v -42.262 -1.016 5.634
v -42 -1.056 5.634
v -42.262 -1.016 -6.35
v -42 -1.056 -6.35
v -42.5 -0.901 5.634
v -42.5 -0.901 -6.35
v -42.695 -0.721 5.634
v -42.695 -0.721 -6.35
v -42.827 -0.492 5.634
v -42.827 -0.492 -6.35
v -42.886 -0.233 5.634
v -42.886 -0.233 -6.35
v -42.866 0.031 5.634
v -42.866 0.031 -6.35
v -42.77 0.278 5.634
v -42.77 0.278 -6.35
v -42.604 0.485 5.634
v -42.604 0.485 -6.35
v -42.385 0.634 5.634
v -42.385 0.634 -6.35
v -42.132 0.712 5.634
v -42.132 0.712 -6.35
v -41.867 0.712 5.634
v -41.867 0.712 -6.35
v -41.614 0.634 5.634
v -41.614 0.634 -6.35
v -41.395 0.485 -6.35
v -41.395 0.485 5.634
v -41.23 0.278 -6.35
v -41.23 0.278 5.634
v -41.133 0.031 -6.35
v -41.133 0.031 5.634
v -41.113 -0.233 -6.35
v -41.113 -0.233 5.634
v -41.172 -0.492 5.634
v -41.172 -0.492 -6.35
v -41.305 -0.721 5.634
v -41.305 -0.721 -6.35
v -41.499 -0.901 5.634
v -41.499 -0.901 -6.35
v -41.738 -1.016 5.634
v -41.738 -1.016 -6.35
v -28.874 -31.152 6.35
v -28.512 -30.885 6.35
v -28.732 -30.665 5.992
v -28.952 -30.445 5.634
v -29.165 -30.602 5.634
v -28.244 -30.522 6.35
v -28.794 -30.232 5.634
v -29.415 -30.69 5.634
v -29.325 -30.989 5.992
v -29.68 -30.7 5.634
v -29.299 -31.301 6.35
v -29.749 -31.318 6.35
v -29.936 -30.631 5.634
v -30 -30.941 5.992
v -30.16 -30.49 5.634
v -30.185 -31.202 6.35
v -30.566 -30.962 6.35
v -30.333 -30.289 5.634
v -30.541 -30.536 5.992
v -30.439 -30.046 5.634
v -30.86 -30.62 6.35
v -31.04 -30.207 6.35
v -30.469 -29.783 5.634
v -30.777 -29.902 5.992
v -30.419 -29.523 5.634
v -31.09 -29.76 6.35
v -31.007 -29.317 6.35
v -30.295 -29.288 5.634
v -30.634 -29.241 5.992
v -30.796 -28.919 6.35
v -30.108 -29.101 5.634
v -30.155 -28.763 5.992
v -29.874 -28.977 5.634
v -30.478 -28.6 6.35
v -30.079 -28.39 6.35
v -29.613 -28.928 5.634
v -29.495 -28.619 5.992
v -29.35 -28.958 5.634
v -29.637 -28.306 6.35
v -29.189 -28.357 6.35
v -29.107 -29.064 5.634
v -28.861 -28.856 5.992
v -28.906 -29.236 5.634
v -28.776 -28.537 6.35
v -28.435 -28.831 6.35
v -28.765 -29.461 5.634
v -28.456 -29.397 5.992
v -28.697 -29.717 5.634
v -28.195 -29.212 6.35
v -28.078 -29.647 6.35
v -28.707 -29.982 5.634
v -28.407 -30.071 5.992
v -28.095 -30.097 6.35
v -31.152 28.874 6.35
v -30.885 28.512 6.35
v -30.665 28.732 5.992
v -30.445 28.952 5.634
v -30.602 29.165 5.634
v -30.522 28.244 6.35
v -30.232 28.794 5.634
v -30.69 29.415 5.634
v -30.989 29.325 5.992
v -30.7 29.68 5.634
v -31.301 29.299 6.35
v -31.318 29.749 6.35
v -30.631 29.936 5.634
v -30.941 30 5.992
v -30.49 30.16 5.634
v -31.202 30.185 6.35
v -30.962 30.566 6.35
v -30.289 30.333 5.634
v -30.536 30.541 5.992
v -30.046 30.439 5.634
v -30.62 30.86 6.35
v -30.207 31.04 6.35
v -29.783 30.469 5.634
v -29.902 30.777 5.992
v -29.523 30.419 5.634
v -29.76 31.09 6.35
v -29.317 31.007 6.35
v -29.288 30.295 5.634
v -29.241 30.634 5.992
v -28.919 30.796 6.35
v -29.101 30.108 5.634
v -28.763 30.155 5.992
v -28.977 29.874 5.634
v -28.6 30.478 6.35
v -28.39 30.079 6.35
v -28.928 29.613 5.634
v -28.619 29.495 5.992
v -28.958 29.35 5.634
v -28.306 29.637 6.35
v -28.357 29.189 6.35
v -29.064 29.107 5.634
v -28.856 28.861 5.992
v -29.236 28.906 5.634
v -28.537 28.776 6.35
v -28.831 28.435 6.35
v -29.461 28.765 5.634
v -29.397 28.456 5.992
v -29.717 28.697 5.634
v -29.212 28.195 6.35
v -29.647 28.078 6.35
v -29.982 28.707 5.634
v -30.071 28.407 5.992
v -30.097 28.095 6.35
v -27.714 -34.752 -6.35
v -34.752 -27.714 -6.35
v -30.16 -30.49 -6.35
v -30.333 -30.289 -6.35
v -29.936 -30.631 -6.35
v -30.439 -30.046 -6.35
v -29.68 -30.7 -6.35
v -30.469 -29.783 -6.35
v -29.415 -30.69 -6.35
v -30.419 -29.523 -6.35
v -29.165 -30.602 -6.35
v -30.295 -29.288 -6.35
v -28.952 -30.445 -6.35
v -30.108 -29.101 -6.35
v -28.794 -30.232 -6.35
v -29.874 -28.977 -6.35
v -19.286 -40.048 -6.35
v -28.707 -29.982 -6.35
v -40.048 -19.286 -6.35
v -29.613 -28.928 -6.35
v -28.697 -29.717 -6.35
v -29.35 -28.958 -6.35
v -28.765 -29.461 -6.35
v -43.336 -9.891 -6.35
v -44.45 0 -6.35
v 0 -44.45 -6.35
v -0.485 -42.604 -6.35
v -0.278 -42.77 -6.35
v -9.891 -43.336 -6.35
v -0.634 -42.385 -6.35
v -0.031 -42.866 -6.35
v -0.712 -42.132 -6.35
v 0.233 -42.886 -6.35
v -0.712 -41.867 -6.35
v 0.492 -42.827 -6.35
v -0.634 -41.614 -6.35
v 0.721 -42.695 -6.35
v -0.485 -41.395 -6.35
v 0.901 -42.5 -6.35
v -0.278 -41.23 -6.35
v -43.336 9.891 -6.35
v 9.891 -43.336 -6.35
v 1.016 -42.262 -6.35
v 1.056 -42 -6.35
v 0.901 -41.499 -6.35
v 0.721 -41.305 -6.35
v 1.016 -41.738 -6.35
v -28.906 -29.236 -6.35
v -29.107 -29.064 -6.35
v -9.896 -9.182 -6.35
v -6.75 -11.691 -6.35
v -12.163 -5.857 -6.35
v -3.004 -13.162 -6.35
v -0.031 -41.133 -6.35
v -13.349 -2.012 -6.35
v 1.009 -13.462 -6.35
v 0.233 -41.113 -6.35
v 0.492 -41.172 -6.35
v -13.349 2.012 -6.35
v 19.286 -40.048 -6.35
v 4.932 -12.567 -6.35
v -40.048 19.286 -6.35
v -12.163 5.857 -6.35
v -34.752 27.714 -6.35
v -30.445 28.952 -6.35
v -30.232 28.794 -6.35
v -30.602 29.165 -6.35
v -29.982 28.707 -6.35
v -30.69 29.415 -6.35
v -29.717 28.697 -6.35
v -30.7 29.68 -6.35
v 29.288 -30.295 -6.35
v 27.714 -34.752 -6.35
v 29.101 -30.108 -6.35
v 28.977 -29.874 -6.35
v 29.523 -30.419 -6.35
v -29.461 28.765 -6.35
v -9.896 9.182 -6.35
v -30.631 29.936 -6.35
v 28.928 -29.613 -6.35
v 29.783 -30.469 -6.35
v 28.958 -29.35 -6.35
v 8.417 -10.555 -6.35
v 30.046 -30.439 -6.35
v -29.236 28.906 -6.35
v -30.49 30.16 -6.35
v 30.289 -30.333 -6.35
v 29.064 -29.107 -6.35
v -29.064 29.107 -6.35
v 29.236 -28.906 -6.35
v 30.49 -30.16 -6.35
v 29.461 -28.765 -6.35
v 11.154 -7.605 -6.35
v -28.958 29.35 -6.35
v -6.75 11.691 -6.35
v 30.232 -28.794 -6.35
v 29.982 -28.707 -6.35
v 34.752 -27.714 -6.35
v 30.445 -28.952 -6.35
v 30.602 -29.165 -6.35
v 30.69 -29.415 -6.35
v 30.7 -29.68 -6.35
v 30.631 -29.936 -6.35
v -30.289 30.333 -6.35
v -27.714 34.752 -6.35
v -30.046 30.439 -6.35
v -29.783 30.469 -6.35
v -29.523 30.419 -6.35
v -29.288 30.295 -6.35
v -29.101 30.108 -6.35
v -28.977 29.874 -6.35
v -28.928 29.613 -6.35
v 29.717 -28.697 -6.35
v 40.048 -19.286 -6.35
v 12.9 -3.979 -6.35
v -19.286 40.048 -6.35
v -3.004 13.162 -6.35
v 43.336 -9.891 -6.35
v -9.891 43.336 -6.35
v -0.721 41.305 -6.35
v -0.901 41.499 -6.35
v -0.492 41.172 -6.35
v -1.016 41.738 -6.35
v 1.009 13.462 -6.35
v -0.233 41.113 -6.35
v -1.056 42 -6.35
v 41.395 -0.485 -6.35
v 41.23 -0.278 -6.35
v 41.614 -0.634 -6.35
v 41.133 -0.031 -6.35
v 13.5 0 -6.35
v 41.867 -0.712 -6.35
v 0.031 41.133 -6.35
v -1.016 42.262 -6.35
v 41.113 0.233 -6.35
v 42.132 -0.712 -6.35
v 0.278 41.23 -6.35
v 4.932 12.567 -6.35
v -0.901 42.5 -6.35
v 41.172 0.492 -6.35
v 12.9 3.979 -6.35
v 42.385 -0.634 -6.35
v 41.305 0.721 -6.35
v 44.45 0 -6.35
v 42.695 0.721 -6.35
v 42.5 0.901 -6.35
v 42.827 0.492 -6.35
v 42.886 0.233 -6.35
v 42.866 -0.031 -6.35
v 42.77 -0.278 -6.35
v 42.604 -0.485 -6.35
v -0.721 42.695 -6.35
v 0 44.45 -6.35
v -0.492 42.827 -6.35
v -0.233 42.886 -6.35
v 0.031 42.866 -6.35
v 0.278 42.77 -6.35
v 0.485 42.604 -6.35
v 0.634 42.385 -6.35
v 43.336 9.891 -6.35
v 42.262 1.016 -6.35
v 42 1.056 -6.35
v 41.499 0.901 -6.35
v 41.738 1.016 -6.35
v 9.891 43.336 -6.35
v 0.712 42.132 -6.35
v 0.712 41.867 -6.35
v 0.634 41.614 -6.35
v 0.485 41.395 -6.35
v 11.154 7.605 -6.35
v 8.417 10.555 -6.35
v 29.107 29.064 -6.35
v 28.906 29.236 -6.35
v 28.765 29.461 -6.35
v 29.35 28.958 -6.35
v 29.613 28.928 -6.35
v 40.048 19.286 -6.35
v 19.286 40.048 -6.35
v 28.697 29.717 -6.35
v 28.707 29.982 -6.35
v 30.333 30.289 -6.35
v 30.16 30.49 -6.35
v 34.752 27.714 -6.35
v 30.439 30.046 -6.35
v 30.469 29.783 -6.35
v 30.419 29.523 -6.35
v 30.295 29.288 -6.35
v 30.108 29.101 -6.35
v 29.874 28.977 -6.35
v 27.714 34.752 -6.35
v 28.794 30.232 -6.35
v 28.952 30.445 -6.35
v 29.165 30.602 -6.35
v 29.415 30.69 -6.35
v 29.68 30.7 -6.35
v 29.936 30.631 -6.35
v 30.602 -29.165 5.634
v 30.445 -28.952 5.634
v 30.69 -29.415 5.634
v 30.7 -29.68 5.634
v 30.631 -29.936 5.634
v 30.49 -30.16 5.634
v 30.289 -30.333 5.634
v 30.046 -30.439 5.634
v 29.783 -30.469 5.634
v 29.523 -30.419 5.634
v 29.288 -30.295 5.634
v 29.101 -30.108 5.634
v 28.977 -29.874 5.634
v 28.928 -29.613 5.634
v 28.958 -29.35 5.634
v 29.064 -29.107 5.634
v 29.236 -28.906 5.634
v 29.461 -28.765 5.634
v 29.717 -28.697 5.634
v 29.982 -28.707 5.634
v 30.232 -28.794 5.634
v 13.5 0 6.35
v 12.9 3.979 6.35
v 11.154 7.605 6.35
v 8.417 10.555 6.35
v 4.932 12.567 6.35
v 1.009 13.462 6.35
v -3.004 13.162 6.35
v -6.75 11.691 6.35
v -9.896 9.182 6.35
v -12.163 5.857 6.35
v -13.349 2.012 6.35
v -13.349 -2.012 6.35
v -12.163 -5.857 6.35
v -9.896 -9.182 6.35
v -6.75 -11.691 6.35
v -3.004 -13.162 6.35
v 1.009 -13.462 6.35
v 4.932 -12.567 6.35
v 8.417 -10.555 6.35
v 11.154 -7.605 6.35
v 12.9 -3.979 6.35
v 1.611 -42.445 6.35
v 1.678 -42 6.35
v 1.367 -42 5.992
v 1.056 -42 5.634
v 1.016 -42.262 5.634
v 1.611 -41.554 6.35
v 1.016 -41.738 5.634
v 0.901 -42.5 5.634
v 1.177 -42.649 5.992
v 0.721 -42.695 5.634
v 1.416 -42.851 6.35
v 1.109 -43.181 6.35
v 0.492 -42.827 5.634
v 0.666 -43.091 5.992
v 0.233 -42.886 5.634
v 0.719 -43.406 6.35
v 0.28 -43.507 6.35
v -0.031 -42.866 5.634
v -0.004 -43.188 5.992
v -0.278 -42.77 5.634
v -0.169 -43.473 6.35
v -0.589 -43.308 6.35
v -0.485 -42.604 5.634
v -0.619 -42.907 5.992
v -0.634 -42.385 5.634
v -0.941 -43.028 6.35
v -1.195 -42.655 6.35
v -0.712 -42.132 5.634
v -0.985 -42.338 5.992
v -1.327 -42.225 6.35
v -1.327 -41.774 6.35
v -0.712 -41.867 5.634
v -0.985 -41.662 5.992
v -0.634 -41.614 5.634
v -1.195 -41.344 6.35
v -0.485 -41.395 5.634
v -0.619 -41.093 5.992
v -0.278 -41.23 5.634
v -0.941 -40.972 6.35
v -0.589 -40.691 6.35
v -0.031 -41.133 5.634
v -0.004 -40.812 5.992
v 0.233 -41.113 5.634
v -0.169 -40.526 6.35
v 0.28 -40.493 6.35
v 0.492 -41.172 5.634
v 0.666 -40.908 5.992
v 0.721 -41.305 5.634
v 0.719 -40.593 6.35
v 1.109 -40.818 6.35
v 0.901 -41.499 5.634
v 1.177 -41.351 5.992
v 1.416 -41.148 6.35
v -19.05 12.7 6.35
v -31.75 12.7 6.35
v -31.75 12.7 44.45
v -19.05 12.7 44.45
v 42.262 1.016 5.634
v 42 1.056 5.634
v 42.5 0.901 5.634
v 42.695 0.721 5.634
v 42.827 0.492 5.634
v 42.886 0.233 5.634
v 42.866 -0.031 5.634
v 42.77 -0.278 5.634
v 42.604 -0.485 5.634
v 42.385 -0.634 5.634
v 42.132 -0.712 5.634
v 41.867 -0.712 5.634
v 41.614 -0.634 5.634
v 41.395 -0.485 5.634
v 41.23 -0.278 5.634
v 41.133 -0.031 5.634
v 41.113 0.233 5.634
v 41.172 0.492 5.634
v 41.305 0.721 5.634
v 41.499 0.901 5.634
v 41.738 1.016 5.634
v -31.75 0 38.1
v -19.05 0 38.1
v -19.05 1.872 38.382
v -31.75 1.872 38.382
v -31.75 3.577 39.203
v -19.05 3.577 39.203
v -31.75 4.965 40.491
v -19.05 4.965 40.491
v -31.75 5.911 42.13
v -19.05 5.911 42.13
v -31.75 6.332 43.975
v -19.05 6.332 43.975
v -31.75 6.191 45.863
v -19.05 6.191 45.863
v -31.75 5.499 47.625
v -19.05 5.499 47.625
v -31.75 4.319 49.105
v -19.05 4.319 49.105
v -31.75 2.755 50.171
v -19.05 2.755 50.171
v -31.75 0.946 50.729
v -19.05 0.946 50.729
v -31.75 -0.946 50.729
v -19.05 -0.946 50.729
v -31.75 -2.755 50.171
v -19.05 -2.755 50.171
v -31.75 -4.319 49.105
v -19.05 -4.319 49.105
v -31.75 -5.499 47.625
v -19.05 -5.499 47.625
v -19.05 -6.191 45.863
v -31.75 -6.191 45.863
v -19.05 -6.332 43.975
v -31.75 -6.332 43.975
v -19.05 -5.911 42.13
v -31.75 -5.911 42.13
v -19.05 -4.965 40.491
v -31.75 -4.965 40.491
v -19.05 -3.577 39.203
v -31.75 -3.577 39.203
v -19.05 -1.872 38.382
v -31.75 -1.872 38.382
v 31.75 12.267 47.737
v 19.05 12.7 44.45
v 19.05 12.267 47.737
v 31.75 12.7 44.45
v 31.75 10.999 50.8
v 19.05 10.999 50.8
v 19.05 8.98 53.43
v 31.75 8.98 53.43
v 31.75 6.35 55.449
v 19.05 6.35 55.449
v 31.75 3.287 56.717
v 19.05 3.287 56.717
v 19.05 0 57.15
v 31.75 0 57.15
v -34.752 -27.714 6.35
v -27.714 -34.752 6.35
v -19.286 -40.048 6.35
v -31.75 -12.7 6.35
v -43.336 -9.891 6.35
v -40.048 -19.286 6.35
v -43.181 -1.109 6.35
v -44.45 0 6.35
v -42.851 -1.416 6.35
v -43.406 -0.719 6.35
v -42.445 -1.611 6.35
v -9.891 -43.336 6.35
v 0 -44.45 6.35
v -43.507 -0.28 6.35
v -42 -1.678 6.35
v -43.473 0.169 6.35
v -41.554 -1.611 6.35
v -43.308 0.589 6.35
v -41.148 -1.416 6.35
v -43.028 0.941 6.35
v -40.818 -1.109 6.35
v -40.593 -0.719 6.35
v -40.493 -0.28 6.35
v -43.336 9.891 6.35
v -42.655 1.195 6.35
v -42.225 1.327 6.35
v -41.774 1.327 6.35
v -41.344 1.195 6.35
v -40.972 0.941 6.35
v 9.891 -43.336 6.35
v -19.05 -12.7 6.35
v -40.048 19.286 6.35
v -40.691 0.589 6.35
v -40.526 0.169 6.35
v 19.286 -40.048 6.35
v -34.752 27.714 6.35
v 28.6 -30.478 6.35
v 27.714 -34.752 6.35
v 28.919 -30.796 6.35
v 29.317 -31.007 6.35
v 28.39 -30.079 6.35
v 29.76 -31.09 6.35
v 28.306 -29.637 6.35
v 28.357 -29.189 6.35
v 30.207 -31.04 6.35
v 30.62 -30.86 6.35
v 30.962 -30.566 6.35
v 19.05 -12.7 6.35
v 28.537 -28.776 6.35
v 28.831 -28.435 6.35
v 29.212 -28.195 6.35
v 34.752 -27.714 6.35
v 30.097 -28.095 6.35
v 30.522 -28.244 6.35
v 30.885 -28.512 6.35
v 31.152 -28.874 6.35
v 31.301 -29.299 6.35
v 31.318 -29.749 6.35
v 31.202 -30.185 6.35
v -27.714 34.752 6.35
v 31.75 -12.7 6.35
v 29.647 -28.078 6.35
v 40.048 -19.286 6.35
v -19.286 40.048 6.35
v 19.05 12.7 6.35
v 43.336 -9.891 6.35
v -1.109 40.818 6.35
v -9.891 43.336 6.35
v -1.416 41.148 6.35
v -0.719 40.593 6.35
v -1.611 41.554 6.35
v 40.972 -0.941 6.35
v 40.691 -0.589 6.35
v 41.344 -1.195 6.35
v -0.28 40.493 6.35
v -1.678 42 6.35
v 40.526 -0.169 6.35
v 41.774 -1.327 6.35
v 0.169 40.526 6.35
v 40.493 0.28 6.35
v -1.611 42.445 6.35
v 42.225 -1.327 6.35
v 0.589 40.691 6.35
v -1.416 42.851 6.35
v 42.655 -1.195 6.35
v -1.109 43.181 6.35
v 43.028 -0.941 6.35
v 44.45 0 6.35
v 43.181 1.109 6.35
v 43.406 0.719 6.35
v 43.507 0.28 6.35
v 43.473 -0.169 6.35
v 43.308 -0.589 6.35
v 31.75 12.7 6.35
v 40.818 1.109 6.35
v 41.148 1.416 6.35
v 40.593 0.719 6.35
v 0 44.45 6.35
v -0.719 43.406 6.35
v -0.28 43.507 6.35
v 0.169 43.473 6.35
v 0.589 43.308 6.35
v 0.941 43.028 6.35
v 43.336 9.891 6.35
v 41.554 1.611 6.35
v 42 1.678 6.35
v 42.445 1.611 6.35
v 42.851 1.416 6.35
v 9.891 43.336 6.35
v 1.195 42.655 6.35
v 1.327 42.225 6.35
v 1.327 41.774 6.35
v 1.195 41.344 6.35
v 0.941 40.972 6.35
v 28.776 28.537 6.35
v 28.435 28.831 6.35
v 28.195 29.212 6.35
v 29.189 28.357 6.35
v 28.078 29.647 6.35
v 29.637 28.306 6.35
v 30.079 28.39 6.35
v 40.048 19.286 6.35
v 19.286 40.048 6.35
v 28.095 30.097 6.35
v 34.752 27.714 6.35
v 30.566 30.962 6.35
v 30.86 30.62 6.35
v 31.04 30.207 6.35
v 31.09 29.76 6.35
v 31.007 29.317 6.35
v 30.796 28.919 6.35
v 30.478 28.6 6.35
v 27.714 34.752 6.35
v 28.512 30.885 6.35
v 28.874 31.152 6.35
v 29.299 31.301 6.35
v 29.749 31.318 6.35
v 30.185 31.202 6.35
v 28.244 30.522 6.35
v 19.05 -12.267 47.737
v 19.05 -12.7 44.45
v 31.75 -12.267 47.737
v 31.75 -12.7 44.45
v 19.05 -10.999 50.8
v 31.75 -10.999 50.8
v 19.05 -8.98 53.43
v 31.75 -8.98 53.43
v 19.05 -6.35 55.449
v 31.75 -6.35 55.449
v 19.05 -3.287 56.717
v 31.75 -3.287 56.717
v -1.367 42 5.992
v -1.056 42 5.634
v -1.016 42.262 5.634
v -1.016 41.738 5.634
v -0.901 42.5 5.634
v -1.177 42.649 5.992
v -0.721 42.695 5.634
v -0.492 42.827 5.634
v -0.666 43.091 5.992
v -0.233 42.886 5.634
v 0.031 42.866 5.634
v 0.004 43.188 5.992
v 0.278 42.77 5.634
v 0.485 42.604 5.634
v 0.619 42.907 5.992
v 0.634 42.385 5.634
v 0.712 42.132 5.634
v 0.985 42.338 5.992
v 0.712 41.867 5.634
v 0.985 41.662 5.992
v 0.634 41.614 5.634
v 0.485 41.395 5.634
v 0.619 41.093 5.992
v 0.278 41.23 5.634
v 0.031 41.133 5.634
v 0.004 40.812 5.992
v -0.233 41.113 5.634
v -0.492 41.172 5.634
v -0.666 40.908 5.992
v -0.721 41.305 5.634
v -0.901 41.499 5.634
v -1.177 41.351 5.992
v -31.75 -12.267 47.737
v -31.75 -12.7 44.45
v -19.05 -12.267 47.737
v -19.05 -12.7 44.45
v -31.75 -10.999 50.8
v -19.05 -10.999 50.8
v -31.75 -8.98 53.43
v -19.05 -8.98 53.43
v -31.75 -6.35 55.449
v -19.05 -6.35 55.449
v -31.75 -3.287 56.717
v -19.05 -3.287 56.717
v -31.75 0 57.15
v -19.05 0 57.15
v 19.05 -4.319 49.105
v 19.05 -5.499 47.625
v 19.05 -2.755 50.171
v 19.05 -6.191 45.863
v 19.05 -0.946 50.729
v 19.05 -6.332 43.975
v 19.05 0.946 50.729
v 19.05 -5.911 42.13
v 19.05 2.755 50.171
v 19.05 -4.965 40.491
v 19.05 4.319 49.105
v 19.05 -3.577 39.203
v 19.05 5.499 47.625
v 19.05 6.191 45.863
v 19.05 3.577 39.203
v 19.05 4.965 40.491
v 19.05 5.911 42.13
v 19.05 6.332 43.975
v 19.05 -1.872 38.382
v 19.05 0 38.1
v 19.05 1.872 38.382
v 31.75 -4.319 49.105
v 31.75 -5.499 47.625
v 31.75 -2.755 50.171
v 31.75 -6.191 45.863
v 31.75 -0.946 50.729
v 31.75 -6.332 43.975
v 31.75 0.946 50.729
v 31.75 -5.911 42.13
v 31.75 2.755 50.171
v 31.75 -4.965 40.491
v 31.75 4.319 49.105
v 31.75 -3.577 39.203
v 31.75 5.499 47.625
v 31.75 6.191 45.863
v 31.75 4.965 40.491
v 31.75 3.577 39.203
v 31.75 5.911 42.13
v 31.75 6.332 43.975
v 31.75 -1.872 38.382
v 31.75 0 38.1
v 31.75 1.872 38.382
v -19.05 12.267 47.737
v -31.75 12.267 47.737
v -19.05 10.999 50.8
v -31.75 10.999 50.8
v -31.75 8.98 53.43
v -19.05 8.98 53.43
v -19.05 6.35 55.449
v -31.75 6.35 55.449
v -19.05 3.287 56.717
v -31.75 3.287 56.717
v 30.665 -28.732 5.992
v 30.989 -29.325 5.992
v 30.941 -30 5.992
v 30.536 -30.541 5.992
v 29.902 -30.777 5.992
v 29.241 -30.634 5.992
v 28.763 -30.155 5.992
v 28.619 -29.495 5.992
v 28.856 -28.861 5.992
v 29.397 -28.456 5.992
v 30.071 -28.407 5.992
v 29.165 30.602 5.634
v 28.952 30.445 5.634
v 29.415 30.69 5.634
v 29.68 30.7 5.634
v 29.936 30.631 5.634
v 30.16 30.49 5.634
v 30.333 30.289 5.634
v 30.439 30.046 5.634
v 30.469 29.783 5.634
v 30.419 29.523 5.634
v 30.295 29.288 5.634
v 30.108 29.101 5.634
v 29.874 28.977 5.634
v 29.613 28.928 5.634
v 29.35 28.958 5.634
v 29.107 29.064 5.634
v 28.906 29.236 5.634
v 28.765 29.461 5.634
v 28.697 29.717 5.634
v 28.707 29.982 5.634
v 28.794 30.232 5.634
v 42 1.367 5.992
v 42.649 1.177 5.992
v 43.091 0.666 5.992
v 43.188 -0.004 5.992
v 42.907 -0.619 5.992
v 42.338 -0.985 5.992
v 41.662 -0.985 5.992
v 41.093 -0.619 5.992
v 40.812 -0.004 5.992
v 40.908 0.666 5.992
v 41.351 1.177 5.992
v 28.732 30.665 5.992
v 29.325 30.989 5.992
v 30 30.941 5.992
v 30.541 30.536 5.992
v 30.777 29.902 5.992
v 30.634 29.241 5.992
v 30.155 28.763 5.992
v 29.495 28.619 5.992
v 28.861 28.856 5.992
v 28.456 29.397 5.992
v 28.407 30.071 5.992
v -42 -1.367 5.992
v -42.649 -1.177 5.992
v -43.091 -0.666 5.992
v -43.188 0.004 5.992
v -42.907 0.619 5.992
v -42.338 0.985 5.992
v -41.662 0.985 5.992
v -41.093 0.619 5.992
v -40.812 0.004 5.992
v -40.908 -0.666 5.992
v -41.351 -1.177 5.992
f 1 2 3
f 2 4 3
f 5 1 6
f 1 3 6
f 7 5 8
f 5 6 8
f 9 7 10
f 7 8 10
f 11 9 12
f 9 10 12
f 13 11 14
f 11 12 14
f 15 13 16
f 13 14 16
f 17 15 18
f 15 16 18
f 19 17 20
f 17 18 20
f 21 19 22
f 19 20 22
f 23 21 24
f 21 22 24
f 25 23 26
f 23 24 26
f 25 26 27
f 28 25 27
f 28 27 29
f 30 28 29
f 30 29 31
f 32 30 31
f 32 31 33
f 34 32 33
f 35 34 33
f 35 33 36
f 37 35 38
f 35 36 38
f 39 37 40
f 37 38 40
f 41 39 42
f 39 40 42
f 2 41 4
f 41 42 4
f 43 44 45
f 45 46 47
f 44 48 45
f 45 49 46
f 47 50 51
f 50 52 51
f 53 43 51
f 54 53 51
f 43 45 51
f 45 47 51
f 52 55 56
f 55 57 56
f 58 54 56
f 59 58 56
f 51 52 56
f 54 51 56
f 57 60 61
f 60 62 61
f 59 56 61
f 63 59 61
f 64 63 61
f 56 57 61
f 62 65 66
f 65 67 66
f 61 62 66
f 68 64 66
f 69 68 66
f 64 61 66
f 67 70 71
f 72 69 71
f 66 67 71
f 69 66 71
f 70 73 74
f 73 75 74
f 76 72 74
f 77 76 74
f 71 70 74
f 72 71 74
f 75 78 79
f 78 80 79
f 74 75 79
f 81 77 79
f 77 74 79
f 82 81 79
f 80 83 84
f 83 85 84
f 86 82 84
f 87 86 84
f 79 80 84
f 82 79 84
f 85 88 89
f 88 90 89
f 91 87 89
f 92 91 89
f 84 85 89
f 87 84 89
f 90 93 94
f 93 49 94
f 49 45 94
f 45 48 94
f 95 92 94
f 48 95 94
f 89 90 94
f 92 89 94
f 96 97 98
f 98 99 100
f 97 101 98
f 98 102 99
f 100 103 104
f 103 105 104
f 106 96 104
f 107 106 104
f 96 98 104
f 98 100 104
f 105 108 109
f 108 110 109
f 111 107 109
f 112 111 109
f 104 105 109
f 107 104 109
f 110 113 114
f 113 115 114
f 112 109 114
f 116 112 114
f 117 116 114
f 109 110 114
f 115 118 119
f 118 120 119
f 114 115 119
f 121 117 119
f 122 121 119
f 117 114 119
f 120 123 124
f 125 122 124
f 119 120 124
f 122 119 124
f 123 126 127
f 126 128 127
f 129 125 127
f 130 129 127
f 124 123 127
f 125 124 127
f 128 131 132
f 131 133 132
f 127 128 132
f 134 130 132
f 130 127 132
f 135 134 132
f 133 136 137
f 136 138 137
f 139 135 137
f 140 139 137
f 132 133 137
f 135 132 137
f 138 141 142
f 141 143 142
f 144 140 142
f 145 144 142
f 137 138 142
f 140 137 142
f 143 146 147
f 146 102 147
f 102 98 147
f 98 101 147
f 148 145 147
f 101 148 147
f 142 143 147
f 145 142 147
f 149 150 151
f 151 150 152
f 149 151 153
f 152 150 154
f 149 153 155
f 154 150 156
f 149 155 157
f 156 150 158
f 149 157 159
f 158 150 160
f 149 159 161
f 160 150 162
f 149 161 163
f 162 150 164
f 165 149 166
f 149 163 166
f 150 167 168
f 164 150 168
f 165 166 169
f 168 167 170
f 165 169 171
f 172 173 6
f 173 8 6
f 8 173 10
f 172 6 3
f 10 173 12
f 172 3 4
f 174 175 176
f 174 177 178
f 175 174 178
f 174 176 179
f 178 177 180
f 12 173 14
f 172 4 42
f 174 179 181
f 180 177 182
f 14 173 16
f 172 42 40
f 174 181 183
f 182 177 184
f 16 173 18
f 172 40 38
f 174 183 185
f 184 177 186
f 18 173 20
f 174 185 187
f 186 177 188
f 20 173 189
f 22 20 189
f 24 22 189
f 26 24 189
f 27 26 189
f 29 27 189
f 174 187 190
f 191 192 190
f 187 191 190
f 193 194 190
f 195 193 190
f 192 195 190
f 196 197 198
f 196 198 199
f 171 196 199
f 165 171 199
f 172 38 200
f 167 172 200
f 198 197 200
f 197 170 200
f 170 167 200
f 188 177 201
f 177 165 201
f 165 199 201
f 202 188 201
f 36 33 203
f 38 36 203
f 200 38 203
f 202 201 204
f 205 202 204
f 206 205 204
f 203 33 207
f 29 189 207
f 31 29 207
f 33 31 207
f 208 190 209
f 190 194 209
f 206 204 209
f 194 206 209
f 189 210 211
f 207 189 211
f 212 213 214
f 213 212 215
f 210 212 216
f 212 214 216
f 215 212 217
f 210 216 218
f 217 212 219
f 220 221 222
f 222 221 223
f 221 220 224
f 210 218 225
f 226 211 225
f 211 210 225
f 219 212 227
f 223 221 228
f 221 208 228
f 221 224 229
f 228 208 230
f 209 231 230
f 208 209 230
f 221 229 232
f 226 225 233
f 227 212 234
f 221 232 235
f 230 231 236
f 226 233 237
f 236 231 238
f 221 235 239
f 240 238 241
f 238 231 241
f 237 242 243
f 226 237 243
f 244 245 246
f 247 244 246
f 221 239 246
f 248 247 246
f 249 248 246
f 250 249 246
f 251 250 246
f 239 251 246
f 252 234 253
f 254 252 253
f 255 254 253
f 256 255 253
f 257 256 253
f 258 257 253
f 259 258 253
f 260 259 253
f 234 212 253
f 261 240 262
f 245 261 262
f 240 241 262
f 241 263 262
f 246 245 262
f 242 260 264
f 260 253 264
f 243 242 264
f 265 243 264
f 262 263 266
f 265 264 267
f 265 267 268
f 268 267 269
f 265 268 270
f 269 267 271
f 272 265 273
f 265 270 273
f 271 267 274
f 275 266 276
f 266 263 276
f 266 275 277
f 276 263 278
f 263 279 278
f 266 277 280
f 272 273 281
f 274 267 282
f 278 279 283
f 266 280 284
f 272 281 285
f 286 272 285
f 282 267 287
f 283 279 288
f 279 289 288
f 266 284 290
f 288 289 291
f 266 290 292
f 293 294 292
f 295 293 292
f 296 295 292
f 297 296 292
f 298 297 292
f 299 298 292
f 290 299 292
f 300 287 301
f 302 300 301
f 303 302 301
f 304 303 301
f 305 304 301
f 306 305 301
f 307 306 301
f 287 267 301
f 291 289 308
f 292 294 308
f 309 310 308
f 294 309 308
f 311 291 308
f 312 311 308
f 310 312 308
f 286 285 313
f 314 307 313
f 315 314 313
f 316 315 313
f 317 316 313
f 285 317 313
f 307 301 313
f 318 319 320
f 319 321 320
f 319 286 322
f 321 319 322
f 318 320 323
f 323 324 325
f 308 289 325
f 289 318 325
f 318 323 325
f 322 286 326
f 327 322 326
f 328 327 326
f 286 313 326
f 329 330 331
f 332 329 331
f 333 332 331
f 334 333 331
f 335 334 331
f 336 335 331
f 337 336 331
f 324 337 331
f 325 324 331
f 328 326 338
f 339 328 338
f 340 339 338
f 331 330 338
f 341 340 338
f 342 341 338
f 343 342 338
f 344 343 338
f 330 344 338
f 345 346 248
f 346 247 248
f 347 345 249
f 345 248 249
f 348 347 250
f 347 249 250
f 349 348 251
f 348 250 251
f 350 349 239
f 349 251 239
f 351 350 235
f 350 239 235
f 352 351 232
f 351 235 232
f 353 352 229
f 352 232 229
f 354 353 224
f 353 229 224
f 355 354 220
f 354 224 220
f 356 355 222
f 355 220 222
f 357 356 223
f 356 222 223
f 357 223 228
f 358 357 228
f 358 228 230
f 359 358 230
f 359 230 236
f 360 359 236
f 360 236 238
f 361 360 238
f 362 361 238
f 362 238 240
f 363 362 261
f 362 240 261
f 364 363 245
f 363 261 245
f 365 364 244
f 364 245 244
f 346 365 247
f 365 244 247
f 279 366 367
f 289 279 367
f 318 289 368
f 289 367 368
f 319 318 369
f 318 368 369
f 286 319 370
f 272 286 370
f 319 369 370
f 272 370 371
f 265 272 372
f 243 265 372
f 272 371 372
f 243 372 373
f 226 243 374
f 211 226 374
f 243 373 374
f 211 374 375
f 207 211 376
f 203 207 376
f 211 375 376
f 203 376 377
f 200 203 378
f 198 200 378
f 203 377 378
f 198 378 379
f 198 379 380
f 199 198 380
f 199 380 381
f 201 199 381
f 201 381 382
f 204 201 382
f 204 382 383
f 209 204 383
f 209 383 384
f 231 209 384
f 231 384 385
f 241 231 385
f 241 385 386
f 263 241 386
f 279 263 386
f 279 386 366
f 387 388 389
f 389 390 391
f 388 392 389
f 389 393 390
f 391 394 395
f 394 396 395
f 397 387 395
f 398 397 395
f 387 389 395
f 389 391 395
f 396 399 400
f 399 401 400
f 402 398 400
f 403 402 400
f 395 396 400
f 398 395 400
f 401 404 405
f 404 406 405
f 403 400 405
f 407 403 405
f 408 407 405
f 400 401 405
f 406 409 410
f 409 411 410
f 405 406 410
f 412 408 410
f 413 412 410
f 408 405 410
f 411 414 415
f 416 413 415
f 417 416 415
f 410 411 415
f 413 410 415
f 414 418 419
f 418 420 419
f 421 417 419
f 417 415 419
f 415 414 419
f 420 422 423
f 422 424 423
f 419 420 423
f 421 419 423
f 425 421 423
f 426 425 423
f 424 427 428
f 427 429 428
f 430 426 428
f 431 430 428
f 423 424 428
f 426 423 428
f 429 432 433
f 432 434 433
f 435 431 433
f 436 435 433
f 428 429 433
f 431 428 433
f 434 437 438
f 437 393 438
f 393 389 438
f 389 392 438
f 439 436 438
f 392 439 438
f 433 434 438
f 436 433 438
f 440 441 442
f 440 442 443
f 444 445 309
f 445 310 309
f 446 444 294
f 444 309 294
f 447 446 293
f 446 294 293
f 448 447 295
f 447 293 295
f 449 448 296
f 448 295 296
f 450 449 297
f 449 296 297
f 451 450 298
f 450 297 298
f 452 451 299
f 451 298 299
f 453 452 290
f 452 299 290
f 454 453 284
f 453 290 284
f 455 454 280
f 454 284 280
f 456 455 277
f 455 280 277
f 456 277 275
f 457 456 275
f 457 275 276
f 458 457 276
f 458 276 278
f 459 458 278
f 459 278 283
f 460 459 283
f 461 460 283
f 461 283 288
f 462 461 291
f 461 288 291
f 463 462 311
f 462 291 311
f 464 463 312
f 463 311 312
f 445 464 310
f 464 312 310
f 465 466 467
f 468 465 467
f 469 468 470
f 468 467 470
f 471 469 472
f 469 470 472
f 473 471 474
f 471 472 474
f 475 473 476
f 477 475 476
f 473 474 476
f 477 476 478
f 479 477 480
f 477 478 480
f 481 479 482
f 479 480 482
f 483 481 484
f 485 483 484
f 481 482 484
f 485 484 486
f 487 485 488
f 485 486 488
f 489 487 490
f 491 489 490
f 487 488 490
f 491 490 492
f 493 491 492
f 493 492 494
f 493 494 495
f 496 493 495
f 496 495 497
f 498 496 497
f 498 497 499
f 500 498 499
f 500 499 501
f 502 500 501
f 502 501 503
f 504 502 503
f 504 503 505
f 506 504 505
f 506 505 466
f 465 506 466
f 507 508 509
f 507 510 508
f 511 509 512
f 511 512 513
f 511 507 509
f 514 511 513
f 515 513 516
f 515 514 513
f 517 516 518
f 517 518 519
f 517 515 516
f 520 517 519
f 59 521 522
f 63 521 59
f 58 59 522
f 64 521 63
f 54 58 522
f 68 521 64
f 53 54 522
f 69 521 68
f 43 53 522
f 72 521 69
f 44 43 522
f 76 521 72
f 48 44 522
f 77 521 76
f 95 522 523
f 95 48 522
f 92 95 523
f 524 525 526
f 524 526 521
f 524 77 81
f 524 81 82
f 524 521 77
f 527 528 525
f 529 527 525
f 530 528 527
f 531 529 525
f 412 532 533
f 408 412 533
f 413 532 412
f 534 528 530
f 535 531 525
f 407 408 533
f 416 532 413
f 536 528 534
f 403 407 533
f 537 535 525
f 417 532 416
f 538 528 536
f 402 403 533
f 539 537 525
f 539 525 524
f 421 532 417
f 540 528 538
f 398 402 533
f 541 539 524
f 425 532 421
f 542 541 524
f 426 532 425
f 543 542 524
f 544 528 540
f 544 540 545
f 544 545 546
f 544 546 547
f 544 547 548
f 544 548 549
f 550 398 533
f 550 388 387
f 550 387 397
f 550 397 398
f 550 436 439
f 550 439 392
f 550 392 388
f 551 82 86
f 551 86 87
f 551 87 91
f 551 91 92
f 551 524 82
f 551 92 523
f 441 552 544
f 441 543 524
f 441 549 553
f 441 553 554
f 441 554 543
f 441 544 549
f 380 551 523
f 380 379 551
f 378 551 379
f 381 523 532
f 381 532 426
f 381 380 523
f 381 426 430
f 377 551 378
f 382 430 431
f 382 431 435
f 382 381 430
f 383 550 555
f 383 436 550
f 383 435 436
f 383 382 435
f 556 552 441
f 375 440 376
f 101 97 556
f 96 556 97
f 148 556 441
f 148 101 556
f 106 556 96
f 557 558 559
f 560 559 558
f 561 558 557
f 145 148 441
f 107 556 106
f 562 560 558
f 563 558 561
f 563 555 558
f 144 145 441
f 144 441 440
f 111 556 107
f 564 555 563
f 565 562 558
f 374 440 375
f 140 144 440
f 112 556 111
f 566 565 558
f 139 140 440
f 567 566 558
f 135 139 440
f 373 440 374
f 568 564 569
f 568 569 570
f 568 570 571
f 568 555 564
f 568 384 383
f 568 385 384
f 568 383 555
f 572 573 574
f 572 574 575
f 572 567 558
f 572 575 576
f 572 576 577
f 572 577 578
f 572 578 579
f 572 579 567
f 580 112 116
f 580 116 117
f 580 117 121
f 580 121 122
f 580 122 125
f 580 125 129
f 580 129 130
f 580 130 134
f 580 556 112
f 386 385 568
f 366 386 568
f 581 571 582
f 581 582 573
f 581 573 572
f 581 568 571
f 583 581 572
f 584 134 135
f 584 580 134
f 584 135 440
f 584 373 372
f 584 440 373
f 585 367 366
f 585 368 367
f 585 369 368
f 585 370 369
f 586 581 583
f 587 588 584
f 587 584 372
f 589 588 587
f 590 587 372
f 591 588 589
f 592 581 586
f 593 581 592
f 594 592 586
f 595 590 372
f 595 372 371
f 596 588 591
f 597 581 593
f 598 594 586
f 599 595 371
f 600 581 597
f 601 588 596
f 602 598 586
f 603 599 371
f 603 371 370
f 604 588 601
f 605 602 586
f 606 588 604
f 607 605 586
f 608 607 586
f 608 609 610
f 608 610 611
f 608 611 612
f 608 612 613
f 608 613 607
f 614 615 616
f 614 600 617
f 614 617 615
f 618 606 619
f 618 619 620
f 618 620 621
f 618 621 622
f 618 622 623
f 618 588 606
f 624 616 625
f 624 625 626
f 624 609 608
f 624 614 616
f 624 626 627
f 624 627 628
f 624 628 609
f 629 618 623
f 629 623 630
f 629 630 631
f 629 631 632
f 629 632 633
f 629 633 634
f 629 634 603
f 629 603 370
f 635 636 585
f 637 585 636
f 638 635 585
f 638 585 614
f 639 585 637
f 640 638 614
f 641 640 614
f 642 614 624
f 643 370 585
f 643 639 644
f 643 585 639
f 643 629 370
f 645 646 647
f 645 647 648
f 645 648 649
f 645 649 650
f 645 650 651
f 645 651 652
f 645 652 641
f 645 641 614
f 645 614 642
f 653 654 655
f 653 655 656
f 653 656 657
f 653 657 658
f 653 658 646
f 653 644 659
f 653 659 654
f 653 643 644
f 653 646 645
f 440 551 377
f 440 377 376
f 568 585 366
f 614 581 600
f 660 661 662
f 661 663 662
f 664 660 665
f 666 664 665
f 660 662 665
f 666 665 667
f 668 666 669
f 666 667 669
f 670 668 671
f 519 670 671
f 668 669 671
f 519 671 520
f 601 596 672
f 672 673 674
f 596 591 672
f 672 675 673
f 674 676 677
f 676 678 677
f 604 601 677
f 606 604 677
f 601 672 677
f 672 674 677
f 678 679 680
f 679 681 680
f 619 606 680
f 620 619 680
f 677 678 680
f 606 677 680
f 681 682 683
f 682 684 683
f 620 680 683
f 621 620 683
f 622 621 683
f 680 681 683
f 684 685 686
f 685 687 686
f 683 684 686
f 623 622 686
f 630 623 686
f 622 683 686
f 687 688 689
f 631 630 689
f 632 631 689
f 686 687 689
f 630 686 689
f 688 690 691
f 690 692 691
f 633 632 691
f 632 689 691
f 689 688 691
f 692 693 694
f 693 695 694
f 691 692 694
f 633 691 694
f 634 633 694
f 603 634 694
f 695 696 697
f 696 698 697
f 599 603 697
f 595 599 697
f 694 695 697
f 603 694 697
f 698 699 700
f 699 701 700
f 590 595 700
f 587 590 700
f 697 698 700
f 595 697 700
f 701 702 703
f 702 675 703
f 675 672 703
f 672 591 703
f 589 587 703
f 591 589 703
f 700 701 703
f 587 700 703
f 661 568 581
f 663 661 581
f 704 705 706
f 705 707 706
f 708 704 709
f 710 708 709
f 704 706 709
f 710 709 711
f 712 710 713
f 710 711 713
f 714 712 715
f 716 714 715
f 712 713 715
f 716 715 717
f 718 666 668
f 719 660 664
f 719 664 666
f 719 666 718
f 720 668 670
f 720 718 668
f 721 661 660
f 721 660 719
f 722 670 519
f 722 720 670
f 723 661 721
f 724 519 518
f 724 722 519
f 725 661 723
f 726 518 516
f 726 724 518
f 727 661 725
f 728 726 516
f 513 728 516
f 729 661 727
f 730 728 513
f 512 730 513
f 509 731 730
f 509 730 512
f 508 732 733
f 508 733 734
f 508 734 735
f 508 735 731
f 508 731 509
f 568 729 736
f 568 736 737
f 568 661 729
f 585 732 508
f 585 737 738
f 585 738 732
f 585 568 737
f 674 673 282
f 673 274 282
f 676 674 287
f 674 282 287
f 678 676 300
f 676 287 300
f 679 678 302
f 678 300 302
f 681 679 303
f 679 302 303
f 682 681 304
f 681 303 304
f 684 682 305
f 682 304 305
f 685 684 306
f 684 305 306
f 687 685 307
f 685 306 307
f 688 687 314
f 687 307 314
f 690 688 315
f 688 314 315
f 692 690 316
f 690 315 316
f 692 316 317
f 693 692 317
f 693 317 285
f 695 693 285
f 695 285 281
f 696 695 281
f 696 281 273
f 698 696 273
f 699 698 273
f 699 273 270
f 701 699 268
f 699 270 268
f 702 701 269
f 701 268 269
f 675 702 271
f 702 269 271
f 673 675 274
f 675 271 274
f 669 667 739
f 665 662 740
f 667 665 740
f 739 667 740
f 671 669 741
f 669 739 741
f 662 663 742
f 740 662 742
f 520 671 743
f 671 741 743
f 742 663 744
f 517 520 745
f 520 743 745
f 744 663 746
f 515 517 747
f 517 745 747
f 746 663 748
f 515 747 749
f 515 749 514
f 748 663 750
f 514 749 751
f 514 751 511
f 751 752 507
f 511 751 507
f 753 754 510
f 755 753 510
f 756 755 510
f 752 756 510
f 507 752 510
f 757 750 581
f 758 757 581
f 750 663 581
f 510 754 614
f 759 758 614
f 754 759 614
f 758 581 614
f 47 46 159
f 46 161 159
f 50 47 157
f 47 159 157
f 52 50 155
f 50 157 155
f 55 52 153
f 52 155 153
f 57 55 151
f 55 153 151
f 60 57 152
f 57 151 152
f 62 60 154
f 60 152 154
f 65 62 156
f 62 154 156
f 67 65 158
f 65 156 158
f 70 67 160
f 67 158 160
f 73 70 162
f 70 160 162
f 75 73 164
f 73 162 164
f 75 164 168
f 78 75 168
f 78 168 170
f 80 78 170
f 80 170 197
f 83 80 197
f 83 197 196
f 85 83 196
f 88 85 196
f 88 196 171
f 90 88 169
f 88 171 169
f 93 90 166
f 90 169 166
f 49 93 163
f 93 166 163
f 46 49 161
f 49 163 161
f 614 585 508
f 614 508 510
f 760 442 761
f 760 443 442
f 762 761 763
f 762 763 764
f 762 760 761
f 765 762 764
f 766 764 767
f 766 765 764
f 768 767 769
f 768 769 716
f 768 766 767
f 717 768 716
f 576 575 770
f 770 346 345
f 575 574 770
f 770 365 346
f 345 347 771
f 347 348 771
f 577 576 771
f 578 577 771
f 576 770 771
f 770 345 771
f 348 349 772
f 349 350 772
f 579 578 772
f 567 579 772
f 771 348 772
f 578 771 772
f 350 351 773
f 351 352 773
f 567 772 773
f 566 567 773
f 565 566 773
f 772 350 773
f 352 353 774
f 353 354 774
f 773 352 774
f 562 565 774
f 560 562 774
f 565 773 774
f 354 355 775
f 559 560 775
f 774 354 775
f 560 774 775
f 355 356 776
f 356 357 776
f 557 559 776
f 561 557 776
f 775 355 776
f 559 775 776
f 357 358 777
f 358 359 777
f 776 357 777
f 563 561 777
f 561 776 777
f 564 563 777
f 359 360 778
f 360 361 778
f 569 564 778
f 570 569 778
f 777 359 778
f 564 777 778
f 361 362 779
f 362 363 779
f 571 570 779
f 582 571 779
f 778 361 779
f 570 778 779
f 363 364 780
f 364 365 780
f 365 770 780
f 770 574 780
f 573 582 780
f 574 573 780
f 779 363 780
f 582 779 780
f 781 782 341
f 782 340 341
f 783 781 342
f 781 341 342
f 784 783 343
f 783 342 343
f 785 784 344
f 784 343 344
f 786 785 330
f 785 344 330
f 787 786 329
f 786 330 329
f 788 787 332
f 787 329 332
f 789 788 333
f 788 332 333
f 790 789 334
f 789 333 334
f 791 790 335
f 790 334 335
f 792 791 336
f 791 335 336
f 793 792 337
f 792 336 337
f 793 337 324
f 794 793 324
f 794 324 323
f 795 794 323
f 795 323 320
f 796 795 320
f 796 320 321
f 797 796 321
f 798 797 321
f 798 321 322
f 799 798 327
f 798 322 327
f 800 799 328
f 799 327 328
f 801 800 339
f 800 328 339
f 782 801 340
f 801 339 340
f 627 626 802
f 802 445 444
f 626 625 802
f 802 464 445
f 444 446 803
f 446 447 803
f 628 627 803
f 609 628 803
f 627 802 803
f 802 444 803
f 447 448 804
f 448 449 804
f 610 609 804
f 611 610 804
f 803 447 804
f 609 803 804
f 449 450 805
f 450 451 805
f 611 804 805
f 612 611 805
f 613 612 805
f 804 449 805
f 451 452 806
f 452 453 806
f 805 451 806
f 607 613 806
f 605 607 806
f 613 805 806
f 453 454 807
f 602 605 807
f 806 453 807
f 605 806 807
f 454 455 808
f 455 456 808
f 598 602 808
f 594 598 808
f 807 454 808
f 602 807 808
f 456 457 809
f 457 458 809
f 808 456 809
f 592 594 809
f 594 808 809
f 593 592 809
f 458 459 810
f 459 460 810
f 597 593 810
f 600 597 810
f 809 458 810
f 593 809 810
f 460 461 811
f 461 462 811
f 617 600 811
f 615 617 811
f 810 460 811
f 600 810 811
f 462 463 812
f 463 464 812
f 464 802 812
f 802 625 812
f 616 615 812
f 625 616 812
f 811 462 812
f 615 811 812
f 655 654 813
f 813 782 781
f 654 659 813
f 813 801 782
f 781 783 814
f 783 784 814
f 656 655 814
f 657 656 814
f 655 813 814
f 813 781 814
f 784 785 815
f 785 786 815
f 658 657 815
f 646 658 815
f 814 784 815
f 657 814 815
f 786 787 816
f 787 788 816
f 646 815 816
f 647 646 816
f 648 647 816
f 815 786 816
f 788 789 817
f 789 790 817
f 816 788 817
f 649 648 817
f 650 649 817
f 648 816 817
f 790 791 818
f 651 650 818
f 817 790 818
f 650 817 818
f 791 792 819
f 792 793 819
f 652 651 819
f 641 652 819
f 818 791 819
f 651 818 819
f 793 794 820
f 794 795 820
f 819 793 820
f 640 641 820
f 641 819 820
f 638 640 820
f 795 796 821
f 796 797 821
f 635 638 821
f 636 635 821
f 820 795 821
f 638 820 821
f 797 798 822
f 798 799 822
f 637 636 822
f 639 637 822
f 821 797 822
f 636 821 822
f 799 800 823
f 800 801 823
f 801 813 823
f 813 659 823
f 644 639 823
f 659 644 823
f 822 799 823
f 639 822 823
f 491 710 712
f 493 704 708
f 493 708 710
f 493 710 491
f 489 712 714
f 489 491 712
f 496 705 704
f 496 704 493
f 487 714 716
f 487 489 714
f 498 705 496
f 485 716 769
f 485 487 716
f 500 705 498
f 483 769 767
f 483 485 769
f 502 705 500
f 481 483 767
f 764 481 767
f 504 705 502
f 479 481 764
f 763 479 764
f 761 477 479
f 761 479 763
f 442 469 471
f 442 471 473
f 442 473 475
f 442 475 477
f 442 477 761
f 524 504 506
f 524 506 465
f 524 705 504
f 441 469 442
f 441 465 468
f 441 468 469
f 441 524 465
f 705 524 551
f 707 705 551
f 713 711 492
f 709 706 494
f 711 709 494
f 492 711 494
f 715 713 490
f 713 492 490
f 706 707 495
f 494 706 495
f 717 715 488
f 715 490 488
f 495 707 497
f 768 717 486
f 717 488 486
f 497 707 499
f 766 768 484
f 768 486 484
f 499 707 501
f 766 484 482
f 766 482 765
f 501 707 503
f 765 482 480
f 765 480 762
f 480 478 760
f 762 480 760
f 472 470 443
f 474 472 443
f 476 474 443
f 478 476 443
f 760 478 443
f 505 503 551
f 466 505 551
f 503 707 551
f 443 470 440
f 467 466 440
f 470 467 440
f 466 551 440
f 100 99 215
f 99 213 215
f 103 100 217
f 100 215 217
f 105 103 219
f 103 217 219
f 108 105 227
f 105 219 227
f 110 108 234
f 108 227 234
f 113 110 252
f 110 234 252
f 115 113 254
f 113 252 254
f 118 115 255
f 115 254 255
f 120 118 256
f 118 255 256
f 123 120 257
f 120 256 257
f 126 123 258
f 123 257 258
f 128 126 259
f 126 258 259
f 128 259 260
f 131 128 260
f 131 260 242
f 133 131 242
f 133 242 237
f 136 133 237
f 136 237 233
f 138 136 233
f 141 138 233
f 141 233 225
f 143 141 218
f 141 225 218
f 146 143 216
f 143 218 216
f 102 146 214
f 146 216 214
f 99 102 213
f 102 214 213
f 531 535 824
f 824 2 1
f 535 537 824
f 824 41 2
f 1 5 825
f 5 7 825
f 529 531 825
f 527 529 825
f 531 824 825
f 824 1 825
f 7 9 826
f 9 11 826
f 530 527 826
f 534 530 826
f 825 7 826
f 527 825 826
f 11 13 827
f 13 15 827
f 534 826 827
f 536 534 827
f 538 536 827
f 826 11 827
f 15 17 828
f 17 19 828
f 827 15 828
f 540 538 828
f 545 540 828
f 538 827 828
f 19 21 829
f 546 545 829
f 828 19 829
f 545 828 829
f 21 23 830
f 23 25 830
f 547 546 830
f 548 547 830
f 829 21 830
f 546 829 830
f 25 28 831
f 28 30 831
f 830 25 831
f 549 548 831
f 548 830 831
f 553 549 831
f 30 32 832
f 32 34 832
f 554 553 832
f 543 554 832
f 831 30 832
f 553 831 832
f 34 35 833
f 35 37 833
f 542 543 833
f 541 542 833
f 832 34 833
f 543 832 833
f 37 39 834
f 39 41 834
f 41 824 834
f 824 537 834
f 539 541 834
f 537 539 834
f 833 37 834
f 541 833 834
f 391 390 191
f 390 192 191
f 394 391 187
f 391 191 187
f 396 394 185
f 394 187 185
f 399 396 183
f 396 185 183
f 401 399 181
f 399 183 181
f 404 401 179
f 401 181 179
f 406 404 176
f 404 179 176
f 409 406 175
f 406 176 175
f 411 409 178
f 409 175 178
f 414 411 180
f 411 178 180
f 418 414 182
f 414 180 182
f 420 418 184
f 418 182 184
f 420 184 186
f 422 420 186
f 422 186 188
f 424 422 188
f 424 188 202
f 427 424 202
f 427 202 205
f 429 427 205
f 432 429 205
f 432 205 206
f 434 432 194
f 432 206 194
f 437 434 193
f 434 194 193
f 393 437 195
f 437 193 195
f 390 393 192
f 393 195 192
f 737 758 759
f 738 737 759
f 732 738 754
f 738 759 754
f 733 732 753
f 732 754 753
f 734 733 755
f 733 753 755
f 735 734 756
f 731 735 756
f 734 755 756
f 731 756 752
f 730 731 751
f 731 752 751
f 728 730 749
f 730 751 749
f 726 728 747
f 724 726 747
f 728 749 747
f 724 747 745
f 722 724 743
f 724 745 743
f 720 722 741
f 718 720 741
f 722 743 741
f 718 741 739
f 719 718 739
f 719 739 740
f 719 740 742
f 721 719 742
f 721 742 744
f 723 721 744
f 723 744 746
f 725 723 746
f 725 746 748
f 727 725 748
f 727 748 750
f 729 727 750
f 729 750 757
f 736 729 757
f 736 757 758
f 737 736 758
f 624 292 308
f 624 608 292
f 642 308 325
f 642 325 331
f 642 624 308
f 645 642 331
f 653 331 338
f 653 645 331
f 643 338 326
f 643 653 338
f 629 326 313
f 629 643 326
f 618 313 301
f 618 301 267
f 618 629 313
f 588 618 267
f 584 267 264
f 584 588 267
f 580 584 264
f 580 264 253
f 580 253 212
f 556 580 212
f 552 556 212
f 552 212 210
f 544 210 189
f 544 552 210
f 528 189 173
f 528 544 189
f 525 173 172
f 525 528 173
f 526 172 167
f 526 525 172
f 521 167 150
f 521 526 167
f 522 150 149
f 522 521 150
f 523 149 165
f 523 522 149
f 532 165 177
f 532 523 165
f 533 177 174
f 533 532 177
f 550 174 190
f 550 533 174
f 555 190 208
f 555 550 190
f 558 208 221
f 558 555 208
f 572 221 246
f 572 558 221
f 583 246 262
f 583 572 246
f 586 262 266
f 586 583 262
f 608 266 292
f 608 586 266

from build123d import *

# Parameters (mm, degrees)
SKETCH1_R                                      = 44.45
BOSS_EXTRUDE1_DEPTH                            = 6.35
SKETCH2_R                                      = 13.5
CUT_EXTRUDE1_DEPTH                             = 65.131856359
CSK_FOR_0_FLAT_HEAD_MACHINE_SCREW1_D           = 1.778
CSK_FOR_0_FLAT_HEAD_MACHINE_SCREW1_CSINK_D     = 3.0226
CSK_FOR_0_FLAT_HEAD_MACHINE_SCREW1_CSINK_ANGLE = 82
CIRPATTERN1_COUNT                              = 8
SKETCH6_W                                      = 12.7
SKETCH6_H                                      = 25.4
BOSS_EXTRUDE2_DEPTH                            = 50.8
FILLET1_R                                      = 12.7
SKETCH7_R                                      = 6.35
CUT_EXTRUDE2_DEPTH                             = 106.111203019


with BuildPart() as part:
    # Sketch1 → Boss-Extrude1 (new, symmetric)
    with BuildSketch(Plane.XY):
        Circle(SKETCH1_R)
    extrude(amount=BOSS_EXTRUDE1_DEPTH, both=True)

    # Sketch2 → Cut-Extrude1 (cut, through all)
    with BuildSketch(Plane.XY.offset(6.35)):
        Circle(SKETCH2_R)
    extrude(amount=-CUT_EXTRUDE1_DEPTH, mode=Mode.SUBTRACT)

    # CSK for #0 Flat Head Machine Screw1 (through all)
    with Locations(Plane(origin=(-0.166965968, 41.999668122, 6.35), x_dir=(1, 0, 0), z_dir=(0, 0, 1))):
        with Locations((0, 0)):
            csk_for_0_flat_head_machine_screw1 = CounterSinkHole(CSK_FOR_0_FLAT_HEAD_MACHINE_SCREW1_D / 2, CSK_FOR_0_FLAT_HEAD_MACHINE_SCREW1_CSINK_D / 2, counter_sink_angle=CSK_FOR_0_FLAT_HEAD_MACHINE_SCREW1_CSINK_ANGLE)

    # CirPattern1: CSK for #0 Flat Head Machine Screw1 ×8 about axis
    cirpattern1_axis = Axis((0, 0, 0), (0, 0, 1))
    for i in range(1, CIRPATTERN1_COUNT):
        add(csk_for_0_flat_head_machine_screw1.rotate(cirpattern1_axis, i * 360 / CIRPATTERN1_COUNT), mode=Mode.SUBTRACT)

    # Sketch6 → Boss-Extrude2 (add)
    with BuildSketch(Plane.XY.offset(6.35)):
        with Locations((-25.4, 0)):
            Rectangle(SKETCH6_W, SKETCH6_H)
        with Locations((25.4, 0)):
            Rectangle(SKETCH6_W, SKETCH6_H)
    extrude(amount=BOSS_EXTRUDE2_DEPTH)

    # Fillet1
    fillet1_edges = [part.edges().sort_by_distance(p)[0] for p in [
        (-25.4, 12.7, 57.15),
        (-25.4, -12.7, 57.15),
        (25.4, -12.7, 57.15),
        (25.4, 12.7, 57.15),
    ]]
    fillet(fillet1_edges, radius=FILLET1_R - 0.0001)  # a hair under: the kernel refuses the full size

    # Sketch7 → Cut-Extrude2 (cut, through all)
    with BuildSketch(Plane(origin=(31.75, 0, 0), x_dir=(0, 0, -1), z_dir=(1, 0, 0))):
        with Locations((-44.45, 0)):
            Circle(SKETCH7_R)
    extrude(amount=-CUT_EXTRUDE2_DEPTH, mode=Mode.SUBTRACT)


solid = part.part
